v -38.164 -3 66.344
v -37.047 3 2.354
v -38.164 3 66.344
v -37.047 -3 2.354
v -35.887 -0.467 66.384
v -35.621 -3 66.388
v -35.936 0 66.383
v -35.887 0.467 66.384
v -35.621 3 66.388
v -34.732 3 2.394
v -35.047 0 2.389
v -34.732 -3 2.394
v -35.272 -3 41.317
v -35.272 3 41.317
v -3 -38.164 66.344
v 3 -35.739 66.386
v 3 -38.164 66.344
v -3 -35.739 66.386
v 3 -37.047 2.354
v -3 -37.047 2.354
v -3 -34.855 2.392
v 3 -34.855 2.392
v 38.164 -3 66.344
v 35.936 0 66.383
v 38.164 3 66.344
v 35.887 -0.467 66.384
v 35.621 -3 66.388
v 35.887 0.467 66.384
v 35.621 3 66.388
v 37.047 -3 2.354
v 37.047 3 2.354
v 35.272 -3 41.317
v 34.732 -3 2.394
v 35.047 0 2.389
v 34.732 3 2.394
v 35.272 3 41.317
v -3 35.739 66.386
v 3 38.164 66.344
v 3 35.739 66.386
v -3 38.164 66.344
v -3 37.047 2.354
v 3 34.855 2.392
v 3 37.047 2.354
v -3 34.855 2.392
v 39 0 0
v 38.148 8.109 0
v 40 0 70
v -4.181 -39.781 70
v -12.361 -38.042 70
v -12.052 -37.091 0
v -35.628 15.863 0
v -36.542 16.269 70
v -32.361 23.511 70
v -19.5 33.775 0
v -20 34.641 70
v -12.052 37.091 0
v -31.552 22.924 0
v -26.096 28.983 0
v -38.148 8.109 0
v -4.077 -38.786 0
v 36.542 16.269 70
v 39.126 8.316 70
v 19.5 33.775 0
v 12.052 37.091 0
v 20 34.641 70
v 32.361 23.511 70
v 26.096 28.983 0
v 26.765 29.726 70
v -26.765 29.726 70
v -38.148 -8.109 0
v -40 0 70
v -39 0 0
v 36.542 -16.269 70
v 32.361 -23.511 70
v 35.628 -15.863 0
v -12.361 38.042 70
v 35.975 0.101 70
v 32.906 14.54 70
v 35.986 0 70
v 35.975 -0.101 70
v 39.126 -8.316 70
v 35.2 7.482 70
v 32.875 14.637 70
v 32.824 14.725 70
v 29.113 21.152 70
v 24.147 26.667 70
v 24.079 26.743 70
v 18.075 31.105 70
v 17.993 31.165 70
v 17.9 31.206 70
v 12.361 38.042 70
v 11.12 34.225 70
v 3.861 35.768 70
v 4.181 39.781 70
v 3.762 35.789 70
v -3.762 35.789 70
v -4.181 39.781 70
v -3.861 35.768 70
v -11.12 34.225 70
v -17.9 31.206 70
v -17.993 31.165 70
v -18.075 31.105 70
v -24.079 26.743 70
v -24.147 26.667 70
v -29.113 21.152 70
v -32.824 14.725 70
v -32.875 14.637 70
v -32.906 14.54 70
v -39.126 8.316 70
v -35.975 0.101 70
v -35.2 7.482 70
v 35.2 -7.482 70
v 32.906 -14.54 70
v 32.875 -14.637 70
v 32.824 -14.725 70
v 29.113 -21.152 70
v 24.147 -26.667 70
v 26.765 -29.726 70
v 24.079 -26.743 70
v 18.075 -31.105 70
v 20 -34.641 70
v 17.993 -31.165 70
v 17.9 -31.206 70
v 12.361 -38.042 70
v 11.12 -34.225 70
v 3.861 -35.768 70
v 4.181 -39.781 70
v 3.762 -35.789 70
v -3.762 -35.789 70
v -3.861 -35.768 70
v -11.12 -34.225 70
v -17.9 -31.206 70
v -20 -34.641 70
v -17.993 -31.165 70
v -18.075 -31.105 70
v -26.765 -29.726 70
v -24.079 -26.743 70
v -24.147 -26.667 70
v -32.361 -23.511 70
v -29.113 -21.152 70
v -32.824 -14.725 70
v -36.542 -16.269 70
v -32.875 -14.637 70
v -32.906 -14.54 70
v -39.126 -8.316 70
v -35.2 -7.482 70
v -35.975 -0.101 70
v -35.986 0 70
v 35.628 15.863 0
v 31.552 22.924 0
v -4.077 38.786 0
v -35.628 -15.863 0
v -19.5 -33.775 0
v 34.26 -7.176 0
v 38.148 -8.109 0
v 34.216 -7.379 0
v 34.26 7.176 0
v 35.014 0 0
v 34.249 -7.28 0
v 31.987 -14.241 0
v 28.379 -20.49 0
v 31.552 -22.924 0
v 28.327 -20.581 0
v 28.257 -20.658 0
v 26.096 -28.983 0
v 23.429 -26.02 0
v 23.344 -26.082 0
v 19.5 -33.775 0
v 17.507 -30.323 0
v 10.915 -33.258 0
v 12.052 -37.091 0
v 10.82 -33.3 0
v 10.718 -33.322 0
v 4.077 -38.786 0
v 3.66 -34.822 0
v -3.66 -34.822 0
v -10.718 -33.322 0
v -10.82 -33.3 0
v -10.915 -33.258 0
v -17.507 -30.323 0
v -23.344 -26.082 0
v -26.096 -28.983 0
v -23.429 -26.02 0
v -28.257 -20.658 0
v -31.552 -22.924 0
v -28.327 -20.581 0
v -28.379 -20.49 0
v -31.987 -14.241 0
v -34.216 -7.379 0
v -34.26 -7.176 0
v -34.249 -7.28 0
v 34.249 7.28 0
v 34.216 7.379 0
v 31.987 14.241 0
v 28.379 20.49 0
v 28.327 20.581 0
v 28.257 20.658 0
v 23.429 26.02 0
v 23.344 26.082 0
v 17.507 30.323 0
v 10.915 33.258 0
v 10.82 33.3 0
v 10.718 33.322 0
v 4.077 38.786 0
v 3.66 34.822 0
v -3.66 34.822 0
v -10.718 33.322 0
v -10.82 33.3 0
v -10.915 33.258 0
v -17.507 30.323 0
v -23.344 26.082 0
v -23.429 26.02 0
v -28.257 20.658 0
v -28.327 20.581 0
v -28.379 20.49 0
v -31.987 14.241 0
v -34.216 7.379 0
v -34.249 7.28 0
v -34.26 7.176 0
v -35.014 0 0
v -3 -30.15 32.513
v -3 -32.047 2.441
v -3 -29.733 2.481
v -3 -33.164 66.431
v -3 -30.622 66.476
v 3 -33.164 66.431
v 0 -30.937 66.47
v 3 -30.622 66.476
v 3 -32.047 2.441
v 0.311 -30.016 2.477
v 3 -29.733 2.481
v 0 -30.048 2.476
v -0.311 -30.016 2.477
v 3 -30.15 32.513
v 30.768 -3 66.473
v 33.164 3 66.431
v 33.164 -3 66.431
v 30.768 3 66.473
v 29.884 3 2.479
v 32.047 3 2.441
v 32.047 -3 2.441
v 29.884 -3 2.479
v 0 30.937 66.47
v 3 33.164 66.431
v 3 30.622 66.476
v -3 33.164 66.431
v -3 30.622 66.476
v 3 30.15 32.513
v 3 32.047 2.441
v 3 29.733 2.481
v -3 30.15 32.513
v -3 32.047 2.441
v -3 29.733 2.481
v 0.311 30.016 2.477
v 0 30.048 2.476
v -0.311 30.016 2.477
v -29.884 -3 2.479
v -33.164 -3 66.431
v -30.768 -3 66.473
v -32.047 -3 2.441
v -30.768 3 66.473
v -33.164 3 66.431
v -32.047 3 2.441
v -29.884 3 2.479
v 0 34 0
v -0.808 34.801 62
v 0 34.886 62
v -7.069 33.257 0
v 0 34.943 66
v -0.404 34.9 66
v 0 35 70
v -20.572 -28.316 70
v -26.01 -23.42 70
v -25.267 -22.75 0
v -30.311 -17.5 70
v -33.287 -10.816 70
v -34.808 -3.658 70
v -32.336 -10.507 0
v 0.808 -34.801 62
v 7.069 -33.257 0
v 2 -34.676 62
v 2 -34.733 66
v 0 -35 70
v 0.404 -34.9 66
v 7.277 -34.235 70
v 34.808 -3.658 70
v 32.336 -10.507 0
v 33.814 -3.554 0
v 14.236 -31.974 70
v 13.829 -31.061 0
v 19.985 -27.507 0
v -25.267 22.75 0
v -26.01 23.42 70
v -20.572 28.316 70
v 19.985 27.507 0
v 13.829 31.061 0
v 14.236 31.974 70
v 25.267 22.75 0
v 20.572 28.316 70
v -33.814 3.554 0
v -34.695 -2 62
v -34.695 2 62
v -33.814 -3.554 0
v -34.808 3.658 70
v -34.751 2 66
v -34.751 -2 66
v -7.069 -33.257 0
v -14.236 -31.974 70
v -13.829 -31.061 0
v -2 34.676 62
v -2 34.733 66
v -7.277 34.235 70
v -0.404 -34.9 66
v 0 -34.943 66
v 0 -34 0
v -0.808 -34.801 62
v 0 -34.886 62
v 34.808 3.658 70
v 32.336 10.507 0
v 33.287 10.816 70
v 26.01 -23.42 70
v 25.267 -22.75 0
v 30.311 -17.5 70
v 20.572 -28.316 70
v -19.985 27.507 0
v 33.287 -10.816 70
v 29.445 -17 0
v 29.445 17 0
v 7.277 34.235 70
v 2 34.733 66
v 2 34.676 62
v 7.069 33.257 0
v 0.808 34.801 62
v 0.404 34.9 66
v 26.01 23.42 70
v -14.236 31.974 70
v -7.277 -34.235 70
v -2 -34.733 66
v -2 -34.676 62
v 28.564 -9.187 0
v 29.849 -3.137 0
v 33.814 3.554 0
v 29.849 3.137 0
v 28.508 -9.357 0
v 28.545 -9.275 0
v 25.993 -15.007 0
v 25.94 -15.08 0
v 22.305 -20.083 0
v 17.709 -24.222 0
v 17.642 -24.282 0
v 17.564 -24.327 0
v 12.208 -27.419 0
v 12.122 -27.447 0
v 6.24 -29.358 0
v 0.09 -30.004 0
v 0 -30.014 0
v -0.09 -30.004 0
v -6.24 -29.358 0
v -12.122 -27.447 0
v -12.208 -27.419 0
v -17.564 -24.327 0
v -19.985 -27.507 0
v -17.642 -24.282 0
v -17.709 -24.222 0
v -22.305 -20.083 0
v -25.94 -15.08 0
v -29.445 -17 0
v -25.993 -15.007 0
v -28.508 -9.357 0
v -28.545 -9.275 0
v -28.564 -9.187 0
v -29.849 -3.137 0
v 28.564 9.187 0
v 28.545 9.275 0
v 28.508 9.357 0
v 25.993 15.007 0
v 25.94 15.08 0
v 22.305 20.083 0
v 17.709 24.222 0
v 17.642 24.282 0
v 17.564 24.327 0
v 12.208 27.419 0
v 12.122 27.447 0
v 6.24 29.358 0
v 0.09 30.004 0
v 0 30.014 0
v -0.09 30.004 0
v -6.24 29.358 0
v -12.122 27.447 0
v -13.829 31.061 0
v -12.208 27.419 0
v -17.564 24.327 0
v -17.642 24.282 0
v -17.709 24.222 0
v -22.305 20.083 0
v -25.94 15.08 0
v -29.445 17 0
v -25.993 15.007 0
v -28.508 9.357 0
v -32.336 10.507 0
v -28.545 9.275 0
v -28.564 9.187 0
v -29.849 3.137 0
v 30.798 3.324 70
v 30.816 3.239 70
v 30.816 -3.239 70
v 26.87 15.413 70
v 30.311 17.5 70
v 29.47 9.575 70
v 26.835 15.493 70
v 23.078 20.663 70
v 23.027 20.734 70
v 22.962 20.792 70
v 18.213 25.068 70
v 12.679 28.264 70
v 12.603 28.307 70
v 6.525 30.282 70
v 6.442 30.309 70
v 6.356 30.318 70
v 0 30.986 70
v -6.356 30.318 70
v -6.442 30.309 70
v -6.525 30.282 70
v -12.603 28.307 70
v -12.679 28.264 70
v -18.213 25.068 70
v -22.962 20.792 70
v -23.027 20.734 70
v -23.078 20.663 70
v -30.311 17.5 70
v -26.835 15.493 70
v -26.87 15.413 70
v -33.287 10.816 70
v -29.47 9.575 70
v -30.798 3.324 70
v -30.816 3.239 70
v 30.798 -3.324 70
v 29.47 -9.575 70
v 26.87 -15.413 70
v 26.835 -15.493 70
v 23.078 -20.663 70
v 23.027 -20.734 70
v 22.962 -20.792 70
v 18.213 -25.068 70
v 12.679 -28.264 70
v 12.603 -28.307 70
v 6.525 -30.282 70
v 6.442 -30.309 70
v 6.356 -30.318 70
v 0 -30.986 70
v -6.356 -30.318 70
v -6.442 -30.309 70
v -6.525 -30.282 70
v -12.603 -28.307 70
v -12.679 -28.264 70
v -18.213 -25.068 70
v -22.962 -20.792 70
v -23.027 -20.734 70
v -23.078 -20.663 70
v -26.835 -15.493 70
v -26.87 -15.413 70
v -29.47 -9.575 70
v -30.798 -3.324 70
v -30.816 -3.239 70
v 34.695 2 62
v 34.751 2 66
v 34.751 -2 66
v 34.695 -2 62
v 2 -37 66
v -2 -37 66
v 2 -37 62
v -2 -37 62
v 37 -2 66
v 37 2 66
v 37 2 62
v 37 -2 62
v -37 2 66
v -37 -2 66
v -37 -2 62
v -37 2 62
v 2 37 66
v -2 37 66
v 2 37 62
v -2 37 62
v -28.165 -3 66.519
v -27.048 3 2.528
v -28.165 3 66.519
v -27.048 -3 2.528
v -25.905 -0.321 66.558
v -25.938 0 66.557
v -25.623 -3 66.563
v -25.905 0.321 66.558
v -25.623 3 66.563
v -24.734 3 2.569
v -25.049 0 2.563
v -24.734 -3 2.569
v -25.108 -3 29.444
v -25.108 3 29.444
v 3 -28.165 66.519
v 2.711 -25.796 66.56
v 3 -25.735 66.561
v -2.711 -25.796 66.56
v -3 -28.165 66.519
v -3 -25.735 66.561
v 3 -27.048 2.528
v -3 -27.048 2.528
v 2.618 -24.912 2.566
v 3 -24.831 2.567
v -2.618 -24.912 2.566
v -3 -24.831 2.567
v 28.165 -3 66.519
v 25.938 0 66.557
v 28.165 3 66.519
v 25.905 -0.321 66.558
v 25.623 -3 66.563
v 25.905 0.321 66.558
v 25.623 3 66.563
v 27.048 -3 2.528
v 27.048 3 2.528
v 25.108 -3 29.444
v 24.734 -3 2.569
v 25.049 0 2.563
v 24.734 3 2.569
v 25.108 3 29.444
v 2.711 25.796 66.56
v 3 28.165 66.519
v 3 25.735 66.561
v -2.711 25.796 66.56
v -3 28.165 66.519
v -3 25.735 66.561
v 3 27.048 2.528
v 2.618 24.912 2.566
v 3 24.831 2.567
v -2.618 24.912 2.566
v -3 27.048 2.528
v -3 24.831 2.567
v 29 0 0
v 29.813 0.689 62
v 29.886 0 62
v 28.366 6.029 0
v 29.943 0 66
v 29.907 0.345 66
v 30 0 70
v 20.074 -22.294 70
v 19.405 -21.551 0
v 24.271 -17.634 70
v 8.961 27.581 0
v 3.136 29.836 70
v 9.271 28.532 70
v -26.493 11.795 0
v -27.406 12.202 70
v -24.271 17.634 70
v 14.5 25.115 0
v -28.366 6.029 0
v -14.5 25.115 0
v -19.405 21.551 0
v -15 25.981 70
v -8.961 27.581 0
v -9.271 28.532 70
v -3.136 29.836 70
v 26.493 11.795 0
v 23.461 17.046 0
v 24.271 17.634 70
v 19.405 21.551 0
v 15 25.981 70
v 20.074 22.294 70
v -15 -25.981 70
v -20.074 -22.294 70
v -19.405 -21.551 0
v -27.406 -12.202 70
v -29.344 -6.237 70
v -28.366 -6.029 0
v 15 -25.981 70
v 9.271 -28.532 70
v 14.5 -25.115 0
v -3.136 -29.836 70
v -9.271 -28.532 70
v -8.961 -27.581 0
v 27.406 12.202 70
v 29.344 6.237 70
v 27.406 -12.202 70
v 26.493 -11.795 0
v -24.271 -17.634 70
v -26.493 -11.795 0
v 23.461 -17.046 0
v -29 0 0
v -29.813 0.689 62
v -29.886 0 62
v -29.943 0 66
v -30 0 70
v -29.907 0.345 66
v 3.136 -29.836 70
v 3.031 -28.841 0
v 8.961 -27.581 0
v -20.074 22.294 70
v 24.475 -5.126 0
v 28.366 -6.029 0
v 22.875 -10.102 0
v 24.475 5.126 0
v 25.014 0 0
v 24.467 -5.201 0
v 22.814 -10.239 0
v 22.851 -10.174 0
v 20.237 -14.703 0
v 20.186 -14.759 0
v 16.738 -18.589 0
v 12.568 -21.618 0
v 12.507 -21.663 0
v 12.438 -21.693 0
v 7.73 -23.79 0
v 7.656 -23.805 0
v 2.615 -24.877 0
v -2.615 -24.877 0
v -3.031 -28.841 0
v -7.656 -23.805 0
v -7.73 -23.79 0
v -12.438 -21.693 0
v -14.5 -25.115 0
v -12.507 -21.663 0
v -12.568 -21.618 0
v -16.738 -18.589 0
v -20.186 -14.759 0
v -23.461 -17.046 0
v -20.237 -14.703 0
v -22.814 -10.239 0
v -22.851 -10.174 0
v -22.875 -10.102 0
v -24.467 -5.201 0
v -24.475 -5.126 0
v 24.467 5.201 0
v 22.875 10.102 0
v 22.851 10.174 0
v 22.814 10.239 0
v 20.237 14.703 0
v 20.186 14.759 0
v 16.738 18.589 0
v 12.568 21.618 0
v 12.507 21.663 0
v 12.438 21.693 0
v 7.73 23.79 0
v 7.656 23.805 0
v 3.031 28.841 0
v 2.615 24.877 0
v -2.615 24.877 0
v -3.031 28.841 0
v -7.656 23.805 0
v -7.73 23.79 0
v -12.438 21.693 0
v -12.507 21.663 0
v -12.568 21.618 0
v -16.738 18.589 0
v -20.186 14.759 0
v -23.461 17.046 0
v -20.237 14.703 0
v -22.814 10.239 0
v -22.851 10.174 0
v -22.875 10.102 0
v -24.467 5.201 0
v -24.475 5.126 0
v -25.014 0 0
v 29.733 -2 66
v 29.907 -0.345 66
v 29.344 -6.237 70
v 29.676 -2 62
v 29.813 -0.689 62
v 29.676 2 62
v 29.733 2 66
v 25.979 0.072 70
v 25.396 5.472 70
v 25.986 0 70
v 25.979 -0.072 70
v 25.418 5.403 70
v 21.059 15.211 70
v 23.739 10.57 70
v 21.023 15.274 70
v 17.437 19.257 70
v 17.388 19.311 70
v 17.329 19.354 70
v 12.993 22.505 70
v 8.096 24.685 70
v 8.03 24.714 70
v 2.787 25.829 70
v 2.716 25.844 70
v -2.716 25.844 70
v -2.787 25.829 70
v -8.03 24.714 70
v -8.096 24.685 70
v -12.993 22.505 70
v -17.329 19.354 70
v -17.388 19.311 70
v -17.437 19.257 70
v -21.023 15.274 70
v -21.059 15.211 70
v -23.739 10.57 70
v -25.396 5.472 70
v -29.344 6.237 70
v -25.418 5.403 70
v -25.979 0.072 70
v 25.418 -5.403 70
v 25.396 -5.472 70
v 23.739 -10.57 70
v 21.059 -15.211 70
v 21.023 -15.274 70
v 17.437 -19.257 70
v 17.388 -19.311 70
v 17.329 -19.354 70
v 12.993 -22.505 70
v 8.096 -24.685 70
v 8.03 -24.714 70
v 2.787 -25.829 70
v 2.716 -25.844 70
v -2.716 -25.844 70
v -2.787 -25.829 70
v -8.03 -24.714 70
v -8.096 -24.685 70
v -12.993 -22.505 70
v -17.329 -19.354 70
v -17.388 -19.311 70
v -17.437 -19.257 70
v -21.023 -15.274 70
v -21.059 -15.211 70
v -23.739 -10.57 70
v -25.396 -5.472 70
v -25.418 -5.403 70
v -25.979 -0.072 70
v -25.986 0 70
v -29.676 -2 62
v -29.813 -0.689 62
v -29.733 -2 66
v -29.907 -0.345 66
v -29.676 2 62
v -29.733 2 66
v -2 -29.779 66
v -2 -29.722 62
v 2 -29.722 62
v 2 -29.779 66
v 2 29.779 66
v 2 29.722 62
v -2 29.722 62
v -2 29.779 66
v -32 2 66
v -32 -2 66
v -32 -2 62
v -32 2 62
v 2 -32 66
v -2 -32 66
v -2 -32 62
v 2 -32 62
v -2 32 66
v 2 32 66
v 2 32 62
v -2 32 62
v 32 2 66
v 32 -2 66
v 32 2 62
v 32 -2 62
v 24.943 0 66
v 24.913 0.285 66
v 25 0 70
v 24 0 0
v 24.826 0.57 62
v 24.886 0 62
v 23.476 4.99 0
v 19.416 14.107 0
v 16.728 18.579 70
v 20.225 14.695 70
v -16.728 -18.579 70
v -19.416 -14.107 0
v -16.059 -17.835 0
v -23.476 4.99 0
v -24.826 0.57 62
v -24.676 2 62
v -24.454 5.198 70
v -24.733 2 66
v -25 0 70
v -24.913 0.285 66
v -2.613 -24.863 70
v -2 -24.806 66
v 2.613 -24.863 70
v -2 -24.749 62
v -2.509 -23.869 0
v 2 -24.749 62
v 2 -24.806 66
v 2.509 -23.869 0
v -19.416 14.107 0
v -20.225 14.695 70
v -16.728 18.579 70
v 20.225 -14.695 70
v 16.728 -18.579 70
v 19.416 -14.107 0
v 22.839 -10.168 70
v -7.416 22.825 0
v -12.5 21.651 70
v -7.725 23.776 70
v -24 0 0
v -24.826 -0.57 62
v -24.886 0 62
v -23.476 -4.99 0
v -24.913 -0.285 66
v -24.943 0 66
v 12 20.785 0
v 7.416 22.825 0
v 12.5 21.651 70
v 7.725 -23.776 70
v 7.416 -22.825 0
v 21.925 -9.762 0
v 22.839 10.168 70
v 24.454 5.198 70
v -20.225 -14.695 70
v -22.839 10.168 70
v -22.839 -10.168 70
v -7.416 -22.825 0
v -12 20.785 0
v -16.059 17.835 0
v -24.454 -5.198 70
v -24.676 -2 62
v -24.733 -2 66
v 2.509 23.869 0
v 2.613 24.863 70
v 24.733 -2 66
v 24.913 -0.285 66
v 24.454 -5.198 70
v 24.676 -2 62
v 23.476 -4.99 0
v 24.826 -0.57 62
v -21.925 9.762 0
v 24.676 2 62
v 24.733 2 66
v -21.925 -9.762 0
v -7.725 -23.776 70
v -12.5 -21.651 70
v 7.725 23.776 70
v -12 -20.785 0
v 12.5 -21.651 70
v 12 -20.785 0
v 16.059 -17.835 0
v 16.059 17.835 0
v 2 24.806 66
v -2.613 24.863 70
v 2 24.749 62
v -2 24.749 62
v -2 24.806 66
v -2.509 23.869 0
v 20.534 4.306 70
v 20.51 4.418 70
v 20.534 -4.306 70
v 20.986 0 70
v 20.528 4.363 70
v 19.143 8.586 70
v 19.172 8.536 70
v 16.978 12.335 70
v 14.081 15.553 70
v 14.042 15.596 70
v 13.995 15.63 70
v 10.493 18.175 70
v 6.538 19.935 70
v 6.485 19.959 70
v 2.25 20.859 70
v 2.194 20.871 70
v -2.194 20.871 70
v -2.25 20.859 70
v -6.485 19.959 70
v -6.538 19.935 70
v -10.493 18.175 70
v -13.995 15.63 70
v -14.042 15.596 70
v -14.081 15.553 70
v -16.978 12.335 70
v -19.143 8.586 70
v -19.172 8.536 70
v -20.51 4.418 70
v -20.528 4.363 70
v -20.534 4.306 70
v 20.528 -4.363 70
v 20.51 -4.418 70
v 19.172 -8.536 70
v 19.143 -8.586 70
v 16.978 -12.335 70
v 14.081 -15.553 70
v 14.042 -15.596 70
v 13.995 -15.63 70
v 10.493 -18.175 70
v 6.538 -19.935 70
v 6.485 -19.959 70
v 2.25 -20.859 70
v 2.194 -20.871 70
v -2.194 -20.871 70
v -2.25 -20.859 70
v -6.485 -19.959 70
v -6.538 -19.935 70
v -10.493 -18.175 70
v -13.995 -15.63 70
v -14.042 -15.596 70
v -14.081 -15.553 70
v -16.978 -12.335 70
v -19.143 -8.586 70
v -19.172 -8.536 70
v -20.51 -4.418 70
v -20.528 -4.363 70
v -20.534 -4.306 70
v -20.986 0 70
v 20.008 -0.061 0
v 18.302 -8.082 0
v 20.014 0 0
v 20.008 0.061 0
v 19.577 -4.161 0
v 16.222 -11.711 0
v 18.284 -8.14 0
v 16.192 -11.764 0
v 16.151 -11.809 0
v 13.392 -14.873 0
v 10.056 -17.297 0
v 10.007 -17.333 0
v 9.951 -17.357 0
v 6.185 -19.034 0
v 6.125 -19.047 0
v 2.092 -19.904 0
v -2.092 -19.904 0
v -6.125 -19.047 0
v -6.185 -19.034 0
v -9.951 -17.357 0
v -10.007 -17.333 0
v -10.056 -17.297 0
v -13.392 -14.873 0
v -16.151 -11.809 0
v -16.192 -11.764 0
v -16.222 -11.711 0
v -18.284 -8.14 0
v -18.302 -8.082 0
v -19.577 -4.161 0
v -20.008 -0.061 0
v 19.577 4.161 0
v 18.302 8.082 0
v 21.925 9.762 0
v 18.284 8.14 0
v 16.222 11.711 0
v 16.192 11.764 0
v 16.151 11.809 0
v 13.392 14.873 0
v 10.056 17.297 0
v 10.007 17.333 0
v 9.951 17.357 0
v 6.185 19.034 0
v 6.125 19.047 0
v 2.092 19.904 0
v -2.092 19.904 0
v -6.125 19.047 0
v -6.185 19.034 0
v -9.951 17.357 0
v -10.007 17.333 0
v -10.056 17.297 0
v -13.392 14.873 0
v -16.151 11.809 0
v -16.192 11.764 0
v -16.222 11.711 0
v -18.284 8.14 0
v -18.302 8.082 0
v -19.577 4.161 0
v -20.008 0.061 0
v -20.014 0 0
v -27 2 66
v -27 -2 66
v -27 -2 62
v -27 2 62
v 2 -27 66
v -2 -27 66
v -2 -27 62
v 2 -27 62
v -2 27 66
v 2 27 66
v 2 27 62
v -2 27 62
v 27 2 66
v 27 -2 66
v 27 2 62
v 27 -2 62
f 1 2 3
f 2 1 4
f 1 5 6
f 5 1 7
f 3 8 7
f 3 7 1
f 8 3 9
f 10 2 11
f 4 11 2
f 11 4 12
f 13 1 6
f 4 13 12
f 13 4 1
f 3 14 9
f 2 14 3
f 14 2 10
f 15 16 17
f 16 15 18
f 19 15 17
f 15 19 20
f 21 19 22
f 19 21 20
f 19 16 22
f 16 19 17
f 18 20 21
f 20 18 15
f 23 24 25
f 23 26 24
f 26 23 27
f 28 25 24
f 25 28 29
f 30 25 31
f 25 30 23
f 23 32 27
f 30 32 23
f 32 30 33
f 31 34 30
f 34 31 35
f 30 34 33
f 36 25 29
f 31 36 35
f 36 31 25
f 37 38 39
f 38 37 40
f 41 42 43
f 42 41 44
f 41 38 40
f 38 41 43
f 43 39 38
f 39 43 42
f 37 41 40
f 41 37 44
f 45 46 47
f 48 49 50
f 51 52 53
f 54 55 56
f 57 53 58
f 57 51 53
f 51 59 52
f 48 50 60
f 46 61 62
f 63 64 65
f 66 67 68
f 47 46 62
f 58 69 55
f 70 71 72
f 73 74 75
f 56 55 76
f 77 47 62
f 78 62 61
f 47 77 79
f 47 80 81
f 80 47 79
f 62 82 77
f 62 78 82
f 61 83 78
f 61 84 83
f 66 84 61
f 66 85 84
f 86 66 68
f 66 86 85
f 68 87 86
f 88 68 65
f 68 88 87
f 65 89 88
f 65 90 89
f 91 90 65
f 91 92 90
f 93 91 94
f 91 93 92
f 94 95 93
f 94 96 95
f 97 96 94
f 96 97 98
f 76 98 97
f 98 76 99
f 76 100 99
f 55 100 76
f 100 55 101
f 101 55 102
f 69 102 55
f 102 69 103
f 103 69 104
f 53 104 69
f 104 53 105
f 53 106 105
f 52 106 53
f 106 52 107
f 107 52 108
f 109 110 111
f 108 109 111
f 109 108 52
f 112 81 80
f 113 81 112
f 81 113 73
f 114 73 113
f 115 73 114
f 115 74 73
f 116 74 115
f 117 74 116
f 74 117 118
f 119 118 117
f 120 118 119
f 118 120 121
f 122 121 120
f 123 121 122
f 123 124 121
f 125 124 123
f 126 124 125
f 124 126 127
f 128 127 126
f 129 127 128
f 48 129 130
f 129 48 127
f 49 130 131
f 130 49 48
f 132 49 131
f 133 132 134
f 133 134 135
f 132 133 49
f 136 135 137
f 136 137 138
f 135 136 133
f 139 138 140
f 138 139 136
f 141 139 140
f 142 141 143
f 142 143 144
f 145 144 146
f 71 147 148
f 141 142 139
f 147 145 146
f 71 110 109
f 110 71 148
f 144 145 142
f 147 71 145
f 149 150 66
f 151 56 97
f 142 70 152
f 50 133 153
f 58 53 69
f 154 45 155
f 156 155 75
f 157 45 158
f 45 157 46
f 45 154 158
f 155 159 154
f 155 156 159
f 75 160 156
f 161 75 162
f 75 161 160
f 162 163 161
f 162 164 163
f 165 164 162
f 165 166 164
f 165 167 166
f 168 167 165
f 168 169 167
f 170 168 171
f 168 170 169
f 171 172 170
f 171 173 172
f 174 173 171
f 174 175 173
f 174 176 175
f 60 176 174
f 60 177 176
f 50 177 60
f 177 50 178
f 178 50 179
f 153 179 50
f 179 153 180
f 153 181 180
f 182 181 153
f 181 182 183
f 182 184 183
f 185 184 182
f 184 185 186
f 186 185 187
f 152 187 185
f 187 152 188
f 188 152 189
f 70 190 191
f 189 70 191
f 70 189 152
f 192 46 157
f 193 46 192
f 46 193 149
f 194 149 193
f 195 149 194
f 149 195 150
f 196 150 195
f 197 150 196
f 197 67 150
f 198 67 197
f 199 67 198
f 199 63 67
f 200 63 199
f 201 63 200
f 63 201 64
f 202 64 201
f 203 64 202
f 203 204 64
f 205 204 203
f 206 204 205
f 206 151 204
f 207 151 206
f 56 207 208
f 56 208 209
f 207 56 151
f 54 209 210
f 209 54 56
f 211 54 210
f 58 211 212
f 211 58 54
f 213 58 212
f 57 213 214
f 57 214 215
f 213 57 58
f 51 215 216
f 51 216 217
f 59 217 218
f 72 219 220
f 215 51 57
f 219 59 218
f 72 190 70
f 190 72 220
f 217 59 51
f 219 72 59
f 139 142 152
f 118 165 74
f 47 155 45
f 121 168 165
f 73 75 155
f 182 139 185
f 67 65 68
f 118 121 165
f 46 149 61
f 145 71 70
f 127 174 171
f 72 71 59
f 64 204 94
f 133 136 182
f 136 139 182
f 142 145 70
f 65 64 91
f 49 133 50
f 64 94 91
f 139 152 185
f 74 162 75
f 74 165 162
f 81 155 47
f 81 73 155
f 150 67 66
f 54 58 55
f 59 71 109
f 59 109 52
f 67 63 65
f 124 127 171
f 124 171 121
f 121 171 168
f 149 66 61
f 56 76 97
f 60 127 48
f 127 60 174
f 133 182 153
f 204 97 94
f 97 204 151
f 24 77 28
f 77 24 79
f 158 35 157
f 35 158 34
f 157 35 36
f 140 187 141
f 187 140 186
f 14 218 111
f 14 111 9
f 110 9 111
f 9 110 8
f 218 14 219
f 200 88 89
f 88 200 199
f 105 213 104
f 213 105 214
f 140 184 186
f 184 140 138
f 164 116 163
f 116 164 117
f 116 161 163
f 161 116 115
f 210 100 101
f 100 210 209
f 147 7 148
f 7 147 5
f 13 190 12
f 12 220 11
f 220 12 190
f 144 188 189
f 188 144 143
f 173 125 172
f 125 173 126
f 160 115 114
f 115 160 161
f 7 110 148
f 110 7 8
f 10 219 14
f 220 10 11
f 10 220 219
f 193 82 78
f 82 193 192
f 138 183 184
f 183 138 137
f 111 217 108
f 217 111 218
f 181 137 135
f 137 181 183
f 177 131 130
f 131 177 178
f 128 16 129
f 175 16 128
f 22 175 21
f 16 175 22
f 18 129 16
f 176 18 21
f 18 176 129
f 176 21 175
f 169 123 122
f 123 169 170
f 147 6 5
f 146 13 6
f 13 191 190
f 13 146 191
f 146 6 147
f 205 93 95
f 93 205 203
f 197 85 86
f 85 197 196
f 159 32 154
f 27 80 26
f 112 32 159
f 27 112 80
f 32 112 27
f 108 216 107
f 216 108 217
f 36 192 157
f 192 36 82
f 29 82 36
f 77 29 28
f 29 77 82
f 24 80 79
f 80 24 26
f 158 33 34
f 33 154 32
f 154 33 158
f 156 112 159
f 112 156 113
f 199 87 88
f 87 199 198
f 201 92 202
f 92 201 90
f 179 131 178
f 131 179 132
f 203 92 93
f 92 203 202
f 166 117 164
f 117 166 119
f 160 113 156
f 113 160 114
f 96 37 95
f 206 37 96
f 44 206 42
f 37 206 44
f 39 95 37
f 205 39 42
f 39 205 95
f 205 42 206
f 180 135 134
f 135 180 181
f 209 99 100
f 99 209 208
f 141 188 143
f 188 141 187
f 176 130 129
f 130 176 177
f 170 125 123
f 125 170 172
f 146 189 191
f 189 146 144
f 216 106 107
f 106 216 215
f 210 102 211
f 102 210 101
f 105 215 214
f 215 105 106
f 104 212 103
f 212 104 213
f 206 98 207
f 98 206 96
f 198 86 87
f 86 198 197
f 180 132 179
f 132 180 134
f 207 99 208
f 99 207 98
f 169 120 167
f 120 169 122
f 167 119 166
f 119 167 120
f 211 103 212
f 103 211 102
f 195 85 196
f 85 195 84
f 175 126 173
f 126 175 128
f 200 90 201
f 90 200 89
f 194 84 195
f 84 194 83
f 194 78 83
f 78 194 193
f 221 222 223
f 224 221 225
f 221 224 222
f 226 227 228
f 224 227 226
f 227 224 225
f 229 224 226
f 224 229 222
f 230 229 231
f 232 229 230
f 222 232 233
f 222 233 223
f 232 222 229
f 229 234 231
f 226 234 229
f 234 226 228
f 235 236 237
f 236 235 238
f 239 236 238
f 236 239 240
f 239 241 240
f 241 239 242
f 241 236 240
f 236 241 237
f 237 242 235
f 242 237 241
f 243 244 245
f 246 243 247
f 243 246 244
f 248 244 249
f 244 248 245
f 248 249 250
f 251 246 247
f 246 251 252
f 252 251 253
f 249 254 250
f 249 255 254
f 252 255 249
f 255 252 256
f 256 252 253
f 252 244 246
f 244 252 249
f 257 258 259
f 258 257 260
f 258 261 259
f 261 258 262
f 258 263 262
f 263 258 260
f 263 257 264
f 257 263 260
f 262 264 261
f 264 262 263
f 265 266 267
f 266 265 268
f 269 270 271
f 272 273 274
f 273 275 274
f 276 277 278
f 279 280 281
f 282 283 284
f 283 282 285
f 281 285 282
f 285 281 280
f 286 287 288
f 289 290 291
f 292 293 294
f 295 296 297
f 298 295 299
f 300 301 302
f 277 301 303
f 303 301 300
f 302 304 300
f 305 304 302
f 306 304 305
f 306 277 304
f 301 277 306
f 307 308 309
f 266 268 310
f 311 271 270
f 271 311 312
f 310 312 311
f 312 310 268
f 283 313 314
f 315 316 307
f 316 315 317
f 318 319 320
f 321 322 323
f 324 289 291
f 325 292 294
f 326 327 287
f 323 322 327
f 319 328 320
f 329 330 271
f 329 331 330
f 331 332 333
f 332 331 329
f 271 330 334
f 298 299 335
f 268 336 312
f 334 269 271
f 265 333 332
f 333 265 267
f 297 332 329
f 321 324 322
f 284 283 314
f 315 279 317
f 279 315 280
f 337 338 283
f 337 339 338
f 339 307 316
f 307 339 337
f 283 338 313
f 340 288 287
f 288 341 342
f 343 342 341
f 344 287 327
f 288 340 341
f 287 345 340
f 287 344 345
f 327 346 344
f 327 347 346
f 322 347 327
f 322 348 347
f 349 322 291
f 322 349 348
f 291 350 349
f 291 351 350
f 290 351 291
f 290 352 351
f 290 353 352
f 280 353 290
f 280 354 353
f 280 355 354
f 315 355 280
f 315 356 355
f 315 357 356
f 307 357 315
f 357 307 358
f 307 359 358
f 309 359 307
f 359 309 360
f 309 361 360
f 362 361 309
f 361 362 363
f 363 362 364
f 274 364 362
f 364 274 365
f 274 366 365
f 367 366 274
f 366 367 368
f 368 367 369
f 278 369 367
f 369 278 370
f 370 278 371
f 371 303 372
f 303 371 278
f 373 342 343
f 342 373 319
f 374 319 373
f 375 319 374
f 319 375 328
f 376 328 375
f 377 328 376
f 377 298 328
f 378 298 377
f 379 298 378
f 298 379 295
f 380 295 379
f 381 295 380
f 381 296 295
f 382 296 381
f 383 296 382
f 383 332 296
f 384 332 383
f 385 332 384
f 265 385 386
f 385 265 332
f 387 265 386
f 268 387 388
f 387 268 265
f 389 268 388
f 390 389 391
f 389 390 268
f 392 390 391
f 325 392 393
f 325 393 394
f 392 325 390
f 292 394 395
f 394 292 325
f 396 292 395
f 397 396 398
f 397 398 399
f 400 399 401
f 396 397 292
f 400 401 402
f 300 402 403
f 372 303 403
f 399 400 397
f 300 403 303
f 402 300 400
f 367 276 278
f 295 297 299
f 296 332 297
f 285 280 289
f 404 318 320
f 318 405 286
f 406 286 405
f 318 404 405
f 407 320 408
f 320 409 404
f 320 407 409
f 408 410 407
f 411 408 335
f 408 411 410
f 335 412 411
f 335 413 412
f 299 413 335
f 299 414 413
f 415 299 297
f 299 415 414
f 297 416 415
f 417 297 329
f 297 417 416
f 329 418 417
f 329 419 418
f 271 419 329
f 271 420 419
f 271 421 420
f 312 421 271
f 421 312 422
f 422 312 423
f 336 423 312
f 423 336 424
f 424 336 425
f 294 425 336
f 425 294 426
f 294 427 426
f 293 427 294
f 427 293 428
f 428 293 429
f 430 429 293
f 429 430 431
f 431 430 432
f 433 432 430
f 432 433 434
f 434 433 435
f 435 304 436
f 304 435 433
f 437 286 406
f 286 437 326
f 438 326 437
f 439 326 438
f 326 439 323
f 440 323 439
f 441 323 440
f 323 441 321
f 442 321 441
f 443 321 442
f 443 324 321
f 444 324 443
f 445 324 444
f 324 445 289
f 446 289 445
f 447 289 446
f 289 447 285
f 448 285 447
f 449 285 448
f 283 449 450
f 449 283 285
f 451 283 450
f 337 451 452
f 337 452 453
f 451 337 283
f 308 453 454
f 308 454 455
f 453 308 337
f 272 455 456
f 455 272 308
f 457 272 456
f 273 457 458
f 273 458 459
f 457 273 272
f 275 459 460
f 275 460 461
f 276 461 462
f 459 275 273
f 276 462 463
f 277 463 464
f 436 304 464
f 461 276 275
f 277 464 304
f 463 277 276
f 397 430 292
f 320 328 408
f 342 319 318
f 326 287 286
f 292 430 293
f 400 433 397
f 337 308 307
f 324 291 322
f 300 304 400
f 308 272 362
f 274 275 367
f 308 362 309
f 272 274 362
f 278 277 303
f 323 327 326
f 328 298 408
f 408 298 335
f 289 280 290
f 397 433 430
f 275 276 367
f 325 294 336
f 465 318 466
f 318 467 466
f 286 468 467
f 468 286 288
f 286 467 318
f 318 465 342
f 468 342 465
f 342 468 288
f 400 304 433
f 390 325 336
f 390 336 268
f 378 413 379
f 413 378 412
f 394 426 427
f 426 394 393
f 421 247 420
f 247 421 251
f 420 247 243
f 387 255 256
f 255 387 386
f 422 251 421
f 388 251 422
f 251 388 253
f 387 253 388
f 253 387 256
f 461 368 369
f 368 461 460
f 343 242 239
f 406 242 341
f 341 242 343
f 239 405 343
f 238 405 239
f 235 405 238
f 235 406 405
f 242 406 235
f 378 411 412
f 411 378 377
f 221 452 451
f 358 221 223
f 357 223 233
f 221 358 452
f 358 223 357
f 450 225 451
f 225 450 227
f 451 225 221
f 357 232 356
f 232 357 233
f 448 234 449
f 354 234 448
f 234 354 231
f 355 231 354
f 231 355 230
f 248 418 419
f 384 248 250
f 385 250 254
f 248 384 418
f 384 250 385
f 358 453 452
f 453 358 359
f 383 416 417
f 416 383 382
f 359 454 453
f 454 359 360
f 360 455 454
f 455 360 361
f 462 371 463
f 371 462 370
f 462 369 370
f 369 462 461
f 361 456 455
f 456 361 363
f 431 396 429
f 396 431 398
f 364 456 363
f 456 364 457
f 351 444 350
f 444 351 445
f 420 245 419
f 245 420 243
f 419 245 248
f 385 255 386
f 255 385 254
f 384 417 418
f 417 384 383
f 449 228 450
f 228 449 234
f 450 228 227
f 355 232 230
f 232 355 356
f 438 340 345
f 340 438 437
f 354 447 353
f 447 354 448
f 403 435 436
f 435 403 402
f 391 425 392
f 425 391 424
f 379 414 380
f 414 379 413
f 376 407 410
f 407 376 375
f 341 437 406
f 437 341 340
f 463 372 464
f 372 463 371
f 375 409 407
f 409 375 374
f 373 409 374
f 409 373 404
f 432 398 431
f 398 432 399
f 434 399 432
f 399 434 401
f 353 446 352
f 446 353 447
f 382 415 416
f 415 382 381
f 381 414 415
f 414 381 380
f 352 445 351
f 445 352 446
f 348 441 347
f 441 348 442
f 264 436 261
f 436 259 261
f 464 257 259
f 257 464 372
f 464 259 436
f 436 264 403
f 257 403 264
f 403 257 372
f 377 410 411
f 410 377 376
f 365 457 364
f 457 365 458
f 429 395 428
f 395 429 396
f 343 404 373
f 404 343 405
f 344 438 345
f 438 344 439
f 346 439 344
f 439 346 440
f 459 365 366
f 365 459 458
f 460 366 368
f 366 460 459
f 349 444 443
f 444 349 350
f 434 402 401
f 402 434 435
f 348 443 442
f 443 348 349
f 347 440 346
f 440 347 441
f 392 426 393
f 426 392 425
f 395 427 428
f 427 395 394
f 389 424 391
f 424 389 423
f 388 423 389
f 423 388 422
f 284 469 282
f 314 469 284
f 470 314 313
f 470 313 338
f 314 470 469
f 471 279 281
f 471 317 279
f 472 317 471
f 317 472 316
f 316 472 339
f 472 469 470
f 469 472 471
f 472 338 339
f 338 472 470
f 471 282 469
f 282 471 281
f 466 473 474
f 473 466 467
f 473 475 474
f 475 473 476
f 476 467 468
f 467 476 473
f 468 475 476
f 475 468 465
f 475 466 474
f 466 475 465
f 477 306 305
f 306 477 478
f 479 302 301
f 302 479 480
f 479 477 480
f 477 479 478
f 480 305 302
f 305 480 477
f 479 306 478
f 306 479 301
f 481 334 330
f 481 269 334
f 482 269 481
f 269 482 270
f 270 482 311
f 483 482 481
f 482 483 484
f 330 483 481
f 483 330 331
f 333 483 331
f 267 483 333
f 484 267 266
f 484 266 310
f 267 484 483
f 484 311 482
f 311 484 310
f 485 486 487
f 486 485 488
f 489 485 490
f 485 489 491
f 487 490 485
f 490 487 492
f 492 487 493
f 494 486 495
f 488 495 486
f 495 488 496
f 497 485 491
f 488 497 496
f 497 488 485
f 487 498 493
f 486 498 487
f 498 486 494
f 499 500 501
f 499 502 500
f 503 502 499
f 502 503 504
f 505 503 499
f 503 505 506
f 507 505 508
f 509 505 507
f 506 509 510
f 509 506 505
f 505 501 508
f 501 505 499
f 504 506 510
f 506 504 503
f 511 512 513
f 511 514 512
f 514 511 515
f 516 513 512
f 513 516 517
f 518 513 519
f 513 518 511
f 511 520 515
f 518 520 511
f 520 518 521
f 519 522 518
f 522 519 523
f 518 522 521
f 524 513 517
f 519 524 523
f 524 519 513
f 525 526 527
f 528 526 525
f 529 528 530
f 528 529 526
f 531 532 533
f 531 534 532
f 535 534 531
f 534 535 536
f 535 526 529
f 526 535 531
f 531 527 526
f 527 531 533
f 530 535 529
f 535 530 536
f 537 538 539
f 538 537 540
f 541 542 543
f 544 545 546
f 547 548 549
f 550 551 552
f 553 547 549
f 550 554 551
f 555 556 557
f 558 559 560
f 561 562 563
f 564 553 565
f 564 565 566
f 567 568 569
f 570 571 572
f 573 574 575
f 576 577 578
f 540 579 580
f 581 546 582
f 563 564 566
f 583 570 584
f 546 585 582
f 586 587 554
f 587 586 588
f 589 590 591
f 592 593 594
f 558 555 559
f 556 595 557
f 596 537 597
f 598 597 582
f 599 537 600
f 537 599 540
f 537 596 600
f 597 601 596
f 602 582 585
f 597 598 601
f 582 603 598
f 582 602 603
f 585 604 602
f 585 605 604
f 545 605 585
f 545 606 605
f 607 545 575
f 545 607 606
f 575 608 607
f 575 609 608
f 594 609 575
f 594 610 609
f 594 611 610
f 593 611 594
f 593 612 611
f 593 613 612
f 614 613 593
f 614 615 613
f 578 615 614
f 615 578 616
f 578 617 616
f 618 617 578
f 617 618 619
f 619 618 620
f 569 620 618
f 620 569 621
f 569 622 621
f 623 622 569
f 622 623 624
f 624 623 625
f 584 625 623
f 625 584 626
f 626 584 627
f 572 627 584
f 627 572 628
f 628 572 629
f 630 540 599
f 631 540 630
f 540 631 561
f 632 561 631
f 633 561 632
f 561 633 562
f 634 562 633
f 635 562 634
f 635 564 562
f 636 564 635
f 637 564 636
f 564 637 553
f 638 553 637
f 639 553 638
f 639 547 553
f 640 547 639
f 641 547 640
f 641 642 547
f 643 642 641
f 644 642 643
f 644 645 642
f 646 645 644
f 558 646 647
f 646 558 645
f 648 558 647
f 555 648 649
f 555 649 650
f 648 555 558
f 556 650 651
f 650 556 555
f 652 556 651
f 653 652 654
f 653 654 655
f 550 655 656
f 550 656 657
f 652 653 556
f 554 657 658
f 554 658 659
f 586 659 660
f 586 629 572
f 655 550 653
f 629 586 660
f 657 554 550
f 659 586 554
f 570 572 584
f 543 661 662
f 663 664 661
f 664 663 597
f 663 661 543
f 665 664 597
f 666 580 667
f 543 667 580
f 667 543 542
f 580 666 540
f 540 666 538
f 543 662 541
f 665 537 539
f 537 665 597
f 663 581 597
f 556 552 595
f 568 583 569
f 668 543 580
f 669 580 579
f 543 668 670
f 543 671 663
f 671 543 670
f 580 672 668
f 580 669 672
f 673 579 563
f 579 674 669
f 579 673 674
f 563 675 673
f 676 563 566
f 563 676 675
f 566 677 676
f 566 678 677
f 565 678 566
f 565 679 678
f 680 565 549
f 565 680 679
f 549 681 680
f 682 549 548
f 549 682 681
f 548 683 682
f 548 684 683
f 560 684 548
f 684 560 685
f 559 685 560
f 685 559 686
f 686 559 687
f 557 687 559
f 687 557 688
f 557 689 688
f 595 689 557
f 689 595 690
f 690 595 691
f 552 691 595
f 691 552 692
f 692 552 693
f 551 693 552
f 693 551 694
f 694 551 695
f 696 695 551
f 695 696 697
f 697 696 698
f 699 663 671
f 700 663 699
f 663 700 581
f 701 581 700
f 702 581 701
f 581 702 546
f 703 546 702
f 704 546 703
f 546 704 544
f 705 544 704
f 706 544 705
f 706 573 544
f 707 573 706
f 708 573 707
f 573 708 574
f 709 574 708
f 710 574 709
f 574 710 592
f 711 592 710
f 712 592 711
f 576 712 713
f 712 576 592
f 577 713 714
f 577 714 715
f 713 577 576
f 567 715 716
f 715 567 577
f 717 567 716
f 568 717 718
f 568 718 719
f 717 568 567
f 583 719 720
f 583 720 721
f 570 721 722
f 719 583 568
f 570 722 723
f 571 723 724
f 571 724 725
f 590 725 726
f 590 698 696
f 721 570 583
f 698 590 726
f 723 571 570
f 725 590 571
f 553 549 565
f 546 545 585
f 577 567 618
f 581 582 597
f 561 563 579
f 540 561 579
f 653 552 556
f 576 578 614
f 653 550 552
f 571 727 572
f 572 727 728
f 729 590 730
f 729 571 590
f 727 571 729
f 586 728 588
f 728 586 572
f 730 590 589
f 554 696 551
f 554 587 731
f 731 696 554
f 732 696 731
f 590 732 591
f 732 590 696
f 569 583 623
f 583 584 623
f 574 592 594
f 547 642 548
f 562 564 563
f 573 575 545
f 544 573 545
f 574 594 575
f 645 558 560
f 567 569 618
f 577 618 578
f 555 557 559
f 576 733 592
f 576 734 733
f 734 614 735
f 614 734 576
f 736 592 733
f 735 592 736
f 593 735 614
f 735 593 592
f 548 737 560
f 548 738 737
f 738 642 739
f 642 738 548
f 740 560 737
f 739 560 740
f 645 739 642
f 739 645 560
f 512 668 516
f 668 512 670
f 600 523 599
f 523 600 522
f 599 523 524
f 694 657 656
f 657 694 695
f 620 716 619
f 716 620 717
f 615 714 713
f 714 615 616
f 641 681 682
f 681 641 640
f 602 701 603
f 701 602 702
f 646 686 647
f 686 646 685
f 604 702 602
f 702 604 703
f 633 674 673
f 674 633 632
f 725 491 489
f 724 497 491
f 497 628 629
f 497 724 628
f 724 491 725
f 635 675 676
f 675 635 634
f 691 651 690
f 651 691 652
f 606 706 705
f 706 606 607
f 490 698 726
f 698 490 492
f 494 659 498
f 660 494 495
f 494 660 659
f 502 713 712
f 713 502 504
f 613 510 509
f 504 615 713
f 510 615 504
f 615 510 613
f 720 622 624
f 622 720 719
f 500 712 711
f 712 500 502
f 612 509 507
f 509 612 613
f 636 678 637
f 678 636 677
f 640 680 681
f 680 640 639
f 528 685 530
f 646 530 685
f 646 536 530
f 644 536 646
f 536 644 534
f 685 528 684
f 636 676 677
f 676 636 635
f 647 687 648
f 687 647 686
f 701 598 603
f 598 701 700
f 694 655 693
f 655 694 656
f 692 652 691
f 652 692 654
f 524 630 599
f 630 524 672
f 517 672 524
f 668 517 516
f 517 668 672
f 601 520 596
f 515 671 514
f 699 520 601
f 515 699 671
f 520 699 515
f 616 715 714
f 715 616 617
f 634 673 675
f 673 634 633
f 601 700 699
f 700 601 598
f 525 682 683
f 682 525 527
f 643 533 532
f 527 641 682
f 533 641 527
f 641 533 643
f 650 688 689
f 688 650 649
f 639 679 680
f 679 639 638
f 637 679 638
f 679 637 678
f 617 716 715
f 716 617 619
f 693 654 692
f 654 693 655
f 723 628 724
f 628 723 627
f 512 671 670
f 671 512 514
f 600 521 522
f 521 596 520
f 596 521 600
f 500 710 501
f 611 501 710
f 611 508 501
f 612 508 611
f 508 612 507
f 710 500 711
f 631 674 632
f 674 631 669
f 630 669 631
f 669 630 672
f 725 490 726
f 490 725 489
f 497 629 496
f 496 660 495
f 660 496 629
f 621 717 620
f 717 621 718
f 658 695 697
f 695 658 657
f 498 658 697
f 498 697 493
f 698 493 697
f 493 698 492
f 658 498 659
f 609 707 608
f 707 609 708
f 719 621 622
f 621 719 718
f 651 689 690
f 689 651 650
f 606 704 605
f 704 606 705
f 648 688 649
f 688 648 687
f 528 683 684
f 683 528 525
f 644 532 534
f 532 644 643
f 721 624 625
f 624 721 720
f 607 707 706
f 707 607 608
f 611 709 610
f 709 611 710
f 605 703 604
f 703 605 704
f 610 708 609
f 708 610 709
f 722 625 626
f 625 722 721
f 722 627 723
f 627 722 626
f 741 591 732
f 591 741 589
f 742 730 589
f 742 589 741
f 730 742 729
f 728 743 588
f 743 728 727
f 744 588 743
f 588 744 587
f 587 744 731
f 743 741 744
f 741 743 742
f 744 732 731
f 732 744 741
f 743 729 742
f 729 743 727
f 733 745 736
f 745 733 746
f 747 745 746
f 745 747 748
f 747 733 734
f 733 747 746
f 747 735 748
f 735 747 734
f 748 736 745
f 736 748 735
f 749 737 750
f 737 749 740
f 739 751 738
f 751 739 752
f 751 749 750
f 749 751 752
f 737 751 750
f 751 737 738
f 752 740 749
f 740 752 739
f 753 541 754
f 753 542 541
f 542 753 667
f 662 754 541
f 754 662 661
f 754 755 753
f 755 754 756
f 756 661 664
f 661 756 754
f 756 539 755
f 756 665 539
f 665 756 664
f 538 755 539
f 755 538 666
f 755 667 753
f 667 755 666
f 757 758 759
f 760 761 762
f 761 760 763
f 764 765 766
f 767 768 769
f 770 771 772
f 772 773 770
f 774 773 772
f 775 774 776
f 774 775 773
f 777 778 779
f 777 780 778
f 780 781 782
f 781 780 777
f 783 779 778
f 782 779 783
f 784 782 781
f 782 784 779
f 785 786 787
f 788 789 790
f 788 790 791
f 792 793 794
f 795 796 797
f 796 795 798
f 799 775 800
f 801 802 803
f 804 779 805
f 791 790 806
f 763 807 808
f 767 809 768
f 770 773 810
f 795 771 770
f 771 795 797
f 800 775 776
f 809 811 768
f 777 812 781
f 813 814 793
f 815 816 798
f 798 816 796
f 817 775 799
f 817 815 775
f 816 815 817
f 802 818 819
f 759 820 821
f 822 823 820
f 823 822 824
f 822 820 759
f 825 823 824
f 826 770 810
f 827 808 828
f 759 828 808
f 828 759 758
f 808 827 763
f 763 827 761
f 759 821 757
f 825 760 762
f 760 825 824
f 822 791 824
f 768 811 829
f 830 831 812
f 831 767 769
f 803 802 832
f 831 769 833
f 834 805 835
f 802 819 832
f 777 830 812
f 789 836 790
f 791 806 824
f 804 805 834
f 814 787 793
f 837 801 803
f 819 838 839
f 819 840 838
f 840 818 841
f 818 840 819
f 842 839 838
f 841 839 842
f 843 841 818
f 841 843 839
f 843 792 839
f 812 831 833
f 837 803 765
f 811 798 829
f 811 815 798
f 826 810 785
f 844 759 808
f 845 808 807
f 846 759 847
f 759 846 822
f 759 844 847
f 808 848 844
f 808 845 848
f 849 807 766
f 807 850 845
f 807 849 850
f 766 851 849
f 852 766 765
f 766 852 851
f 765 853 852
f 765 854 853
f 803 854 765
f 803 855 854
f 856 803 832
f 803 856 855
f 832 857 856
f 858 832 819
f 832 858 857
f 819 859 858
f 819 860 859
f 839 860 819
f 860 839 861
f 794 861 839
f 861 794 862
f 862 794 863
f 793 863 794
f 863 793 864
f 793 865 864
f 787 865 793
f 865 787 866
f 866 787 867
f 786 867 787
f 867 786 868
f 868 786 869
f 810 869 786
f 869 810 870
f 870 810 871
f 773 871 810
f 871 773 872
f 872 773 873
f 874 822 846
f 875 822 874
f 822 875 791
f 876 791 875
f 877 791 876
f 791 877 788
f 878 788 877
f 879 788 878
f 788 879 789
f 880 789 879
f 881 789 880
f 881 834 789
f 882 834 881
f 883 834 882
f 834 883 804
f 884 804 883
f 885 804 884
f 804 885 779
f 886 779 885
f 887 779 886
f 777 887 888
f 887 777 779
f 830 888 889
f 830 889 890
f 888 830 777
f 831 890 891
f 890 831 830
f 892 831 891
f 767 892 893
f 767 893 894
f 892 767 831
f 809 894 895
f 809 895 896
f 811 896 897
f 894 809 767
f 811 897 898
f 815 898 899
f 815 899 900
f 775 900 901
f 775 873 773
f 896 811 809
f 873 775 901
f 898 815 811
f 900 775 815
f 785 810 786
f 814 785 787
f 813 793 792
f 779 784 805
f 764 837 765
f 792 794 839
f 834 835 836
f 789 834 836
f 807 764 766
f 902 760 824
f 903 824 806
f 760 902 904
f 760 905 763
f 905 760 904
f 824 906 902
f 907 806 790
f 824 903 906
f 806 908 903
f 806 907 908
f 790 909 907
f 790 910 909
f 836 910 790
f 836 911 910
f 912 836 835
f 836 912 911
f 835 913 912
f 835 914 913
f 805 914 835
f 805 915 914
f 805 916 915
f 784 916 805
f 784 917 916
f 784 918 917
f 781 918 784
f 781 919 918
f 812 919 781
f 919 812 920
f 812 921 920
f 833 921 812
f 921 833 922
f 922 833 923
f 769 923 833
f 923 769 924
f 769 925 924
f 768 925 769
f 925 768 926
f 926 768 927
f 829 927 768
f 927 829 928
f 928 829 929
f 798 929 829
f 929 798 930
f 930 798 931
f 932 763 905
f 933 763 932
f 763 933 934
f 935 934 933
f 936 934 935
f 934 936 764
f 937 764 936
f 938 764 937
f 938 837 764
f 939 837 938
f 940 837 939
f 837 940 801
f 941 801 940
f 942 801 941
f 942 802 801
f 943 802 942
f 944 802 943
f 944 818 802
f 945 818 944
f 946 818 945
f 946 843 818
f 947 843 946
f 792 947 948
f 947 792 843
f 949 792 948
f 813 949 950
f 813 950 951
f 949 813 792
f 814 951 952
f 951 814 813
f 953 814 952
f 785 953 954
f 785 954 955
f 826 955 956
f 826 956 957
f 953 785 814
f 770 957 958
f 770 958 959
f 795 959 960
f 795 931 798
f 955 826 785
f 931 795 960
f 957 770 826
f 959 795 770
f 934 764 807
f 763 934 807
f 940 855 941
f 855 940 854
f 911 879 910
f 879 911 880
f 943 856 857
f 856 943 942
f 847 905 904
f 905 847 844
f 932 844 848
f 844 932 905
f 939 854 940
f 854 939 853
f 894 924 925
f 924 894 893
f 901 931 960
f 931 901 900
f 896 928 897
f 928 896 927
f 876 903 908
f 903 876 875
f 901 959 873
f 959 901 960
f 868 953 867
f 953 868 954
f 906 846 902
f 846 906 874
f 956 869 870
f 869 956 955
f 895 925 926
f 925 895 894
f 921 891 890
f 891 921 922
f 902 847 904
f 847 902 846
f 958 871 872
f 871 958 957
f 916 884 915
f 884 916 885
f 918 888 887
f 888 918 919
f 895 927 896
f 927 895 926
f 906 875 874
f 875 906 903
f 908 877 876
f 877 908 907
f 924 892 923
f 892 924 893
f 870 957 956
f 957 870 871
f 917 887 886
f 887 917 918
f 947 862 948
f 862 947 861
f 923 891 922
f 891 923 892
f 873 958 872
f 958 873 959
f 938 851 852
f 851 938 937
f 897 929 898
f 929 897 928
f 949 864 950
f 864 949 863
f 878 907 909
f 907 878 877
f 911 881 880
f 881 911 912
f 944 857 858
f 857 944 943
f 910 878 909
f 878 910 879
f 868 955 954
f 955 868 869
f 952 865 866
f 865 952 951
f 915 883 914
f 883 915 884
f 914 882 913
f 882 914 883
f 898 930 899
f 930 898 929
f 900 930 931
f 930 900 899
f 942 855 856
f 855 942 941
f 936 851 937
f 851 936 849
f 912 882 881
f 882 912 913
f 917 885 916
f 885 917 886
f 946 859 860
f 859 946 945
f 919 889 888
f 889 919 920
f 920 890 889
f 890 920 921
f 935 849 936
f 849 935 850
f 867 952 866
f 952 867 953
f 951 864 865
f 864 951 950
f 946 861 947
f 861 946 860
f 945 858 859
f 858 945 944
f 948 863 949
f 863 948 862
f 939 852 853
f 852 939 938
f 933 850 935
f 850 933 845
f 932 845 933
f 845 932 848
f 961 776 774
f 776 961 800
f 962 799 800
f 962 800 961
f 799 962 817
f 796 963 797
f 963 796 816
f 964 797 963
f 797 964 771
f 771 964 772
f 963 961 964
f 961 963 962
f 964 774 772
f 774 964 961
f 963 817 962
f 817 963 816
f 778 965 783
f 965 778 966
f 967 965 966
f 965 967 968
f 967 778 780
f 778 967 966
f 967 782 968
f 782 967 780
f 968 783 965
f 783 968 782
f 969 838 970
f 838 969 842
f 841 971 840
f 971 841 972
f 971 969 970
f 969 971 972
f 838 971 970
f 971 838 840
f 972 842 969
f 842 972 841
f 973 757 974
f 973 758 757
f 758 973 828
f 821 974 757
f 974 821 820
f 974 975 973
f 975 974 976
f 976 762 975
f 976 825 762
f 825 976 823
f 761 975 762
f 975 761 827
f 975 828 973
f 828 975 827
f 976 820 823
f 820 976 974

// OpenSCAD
module innerTube(radius,height) {
	difference() {
		cylinder(height,radius-1,radius);
		translate([0,0,-1]) cylinder(height+2,radius-5,radius-4);
		for (i=[0:3]) {
			rotate([0,-1,i*90])translate([0-(radius-3),-3,3]) color([1,0,0,1])cube([4,6,height-6]);
		}
	}
}
module peggedTube(radius,height) {
	union() {
		innerTube(radius,height);
		rotate([0,0,0]) translate([0-(radius+2),-2,height-8]) cube([3,4,4]);
		rotate([0,0,90]) translate([0-(radius+2),-2,height-8]) cube([3,4,4]);
		rotate([0,0,-90]) translate([0-(radius+2),-2,height-8]) cube([3,4,4]);
		rotate([0,0,180]) translate([0-(radius+2),-2,height-8]) cube([3,4,4]);
	}
}
module centerTube(radius,height) {
	union() {
		difference() {
			cylinder(height,radius-1,radius);
			translate([0,0,-1]) cylinder(height+2,radius-5,radius-4);
		}
		rotate([0,0,0]) translate([0-(radius+2),-2,height-8]) cube([4,4,4]);
		rotate([0,0,90]) translate([0-(radius+2),-2,height-8]) cube([4,4,4]);
		rotate([0,0,-90]) translate([0-(radius+2),-2,height-8]) cube([4,4,4]);
		rotate([0,0,180]) translate([0-(radius+2),-2,height-8]) cube([4,4,4]);
	}
}
module tube(tubeOuterRadius,tubeHeight,tubeCount,extend) {
	union() {
		innerTube(tubeOuterRadius,tubeHeight);
		if (tubeCount > 2) {
			for (i=[1:tubeCount-2]) {
				translate([0,0,extend*(0-i*(tubeHeight-12))]) rotate([0,0,(i%2)*90]) peggedTube(tubeOuterRadius-i*5,tubeHeight);
			}
		}
		if (tubeCount > 1) {
			translate([0,0,extend*(0-(tubeCount-1)*(tubeHeight-12))])  centerTube(tubeOuterRadius-(tubeCount-1)*5,tubeHeight);
		}
	}
}
//difference() {
	tube(40,70,4,0);
//	translate([0,0,-1]) cube([40,40,92]);
//}
